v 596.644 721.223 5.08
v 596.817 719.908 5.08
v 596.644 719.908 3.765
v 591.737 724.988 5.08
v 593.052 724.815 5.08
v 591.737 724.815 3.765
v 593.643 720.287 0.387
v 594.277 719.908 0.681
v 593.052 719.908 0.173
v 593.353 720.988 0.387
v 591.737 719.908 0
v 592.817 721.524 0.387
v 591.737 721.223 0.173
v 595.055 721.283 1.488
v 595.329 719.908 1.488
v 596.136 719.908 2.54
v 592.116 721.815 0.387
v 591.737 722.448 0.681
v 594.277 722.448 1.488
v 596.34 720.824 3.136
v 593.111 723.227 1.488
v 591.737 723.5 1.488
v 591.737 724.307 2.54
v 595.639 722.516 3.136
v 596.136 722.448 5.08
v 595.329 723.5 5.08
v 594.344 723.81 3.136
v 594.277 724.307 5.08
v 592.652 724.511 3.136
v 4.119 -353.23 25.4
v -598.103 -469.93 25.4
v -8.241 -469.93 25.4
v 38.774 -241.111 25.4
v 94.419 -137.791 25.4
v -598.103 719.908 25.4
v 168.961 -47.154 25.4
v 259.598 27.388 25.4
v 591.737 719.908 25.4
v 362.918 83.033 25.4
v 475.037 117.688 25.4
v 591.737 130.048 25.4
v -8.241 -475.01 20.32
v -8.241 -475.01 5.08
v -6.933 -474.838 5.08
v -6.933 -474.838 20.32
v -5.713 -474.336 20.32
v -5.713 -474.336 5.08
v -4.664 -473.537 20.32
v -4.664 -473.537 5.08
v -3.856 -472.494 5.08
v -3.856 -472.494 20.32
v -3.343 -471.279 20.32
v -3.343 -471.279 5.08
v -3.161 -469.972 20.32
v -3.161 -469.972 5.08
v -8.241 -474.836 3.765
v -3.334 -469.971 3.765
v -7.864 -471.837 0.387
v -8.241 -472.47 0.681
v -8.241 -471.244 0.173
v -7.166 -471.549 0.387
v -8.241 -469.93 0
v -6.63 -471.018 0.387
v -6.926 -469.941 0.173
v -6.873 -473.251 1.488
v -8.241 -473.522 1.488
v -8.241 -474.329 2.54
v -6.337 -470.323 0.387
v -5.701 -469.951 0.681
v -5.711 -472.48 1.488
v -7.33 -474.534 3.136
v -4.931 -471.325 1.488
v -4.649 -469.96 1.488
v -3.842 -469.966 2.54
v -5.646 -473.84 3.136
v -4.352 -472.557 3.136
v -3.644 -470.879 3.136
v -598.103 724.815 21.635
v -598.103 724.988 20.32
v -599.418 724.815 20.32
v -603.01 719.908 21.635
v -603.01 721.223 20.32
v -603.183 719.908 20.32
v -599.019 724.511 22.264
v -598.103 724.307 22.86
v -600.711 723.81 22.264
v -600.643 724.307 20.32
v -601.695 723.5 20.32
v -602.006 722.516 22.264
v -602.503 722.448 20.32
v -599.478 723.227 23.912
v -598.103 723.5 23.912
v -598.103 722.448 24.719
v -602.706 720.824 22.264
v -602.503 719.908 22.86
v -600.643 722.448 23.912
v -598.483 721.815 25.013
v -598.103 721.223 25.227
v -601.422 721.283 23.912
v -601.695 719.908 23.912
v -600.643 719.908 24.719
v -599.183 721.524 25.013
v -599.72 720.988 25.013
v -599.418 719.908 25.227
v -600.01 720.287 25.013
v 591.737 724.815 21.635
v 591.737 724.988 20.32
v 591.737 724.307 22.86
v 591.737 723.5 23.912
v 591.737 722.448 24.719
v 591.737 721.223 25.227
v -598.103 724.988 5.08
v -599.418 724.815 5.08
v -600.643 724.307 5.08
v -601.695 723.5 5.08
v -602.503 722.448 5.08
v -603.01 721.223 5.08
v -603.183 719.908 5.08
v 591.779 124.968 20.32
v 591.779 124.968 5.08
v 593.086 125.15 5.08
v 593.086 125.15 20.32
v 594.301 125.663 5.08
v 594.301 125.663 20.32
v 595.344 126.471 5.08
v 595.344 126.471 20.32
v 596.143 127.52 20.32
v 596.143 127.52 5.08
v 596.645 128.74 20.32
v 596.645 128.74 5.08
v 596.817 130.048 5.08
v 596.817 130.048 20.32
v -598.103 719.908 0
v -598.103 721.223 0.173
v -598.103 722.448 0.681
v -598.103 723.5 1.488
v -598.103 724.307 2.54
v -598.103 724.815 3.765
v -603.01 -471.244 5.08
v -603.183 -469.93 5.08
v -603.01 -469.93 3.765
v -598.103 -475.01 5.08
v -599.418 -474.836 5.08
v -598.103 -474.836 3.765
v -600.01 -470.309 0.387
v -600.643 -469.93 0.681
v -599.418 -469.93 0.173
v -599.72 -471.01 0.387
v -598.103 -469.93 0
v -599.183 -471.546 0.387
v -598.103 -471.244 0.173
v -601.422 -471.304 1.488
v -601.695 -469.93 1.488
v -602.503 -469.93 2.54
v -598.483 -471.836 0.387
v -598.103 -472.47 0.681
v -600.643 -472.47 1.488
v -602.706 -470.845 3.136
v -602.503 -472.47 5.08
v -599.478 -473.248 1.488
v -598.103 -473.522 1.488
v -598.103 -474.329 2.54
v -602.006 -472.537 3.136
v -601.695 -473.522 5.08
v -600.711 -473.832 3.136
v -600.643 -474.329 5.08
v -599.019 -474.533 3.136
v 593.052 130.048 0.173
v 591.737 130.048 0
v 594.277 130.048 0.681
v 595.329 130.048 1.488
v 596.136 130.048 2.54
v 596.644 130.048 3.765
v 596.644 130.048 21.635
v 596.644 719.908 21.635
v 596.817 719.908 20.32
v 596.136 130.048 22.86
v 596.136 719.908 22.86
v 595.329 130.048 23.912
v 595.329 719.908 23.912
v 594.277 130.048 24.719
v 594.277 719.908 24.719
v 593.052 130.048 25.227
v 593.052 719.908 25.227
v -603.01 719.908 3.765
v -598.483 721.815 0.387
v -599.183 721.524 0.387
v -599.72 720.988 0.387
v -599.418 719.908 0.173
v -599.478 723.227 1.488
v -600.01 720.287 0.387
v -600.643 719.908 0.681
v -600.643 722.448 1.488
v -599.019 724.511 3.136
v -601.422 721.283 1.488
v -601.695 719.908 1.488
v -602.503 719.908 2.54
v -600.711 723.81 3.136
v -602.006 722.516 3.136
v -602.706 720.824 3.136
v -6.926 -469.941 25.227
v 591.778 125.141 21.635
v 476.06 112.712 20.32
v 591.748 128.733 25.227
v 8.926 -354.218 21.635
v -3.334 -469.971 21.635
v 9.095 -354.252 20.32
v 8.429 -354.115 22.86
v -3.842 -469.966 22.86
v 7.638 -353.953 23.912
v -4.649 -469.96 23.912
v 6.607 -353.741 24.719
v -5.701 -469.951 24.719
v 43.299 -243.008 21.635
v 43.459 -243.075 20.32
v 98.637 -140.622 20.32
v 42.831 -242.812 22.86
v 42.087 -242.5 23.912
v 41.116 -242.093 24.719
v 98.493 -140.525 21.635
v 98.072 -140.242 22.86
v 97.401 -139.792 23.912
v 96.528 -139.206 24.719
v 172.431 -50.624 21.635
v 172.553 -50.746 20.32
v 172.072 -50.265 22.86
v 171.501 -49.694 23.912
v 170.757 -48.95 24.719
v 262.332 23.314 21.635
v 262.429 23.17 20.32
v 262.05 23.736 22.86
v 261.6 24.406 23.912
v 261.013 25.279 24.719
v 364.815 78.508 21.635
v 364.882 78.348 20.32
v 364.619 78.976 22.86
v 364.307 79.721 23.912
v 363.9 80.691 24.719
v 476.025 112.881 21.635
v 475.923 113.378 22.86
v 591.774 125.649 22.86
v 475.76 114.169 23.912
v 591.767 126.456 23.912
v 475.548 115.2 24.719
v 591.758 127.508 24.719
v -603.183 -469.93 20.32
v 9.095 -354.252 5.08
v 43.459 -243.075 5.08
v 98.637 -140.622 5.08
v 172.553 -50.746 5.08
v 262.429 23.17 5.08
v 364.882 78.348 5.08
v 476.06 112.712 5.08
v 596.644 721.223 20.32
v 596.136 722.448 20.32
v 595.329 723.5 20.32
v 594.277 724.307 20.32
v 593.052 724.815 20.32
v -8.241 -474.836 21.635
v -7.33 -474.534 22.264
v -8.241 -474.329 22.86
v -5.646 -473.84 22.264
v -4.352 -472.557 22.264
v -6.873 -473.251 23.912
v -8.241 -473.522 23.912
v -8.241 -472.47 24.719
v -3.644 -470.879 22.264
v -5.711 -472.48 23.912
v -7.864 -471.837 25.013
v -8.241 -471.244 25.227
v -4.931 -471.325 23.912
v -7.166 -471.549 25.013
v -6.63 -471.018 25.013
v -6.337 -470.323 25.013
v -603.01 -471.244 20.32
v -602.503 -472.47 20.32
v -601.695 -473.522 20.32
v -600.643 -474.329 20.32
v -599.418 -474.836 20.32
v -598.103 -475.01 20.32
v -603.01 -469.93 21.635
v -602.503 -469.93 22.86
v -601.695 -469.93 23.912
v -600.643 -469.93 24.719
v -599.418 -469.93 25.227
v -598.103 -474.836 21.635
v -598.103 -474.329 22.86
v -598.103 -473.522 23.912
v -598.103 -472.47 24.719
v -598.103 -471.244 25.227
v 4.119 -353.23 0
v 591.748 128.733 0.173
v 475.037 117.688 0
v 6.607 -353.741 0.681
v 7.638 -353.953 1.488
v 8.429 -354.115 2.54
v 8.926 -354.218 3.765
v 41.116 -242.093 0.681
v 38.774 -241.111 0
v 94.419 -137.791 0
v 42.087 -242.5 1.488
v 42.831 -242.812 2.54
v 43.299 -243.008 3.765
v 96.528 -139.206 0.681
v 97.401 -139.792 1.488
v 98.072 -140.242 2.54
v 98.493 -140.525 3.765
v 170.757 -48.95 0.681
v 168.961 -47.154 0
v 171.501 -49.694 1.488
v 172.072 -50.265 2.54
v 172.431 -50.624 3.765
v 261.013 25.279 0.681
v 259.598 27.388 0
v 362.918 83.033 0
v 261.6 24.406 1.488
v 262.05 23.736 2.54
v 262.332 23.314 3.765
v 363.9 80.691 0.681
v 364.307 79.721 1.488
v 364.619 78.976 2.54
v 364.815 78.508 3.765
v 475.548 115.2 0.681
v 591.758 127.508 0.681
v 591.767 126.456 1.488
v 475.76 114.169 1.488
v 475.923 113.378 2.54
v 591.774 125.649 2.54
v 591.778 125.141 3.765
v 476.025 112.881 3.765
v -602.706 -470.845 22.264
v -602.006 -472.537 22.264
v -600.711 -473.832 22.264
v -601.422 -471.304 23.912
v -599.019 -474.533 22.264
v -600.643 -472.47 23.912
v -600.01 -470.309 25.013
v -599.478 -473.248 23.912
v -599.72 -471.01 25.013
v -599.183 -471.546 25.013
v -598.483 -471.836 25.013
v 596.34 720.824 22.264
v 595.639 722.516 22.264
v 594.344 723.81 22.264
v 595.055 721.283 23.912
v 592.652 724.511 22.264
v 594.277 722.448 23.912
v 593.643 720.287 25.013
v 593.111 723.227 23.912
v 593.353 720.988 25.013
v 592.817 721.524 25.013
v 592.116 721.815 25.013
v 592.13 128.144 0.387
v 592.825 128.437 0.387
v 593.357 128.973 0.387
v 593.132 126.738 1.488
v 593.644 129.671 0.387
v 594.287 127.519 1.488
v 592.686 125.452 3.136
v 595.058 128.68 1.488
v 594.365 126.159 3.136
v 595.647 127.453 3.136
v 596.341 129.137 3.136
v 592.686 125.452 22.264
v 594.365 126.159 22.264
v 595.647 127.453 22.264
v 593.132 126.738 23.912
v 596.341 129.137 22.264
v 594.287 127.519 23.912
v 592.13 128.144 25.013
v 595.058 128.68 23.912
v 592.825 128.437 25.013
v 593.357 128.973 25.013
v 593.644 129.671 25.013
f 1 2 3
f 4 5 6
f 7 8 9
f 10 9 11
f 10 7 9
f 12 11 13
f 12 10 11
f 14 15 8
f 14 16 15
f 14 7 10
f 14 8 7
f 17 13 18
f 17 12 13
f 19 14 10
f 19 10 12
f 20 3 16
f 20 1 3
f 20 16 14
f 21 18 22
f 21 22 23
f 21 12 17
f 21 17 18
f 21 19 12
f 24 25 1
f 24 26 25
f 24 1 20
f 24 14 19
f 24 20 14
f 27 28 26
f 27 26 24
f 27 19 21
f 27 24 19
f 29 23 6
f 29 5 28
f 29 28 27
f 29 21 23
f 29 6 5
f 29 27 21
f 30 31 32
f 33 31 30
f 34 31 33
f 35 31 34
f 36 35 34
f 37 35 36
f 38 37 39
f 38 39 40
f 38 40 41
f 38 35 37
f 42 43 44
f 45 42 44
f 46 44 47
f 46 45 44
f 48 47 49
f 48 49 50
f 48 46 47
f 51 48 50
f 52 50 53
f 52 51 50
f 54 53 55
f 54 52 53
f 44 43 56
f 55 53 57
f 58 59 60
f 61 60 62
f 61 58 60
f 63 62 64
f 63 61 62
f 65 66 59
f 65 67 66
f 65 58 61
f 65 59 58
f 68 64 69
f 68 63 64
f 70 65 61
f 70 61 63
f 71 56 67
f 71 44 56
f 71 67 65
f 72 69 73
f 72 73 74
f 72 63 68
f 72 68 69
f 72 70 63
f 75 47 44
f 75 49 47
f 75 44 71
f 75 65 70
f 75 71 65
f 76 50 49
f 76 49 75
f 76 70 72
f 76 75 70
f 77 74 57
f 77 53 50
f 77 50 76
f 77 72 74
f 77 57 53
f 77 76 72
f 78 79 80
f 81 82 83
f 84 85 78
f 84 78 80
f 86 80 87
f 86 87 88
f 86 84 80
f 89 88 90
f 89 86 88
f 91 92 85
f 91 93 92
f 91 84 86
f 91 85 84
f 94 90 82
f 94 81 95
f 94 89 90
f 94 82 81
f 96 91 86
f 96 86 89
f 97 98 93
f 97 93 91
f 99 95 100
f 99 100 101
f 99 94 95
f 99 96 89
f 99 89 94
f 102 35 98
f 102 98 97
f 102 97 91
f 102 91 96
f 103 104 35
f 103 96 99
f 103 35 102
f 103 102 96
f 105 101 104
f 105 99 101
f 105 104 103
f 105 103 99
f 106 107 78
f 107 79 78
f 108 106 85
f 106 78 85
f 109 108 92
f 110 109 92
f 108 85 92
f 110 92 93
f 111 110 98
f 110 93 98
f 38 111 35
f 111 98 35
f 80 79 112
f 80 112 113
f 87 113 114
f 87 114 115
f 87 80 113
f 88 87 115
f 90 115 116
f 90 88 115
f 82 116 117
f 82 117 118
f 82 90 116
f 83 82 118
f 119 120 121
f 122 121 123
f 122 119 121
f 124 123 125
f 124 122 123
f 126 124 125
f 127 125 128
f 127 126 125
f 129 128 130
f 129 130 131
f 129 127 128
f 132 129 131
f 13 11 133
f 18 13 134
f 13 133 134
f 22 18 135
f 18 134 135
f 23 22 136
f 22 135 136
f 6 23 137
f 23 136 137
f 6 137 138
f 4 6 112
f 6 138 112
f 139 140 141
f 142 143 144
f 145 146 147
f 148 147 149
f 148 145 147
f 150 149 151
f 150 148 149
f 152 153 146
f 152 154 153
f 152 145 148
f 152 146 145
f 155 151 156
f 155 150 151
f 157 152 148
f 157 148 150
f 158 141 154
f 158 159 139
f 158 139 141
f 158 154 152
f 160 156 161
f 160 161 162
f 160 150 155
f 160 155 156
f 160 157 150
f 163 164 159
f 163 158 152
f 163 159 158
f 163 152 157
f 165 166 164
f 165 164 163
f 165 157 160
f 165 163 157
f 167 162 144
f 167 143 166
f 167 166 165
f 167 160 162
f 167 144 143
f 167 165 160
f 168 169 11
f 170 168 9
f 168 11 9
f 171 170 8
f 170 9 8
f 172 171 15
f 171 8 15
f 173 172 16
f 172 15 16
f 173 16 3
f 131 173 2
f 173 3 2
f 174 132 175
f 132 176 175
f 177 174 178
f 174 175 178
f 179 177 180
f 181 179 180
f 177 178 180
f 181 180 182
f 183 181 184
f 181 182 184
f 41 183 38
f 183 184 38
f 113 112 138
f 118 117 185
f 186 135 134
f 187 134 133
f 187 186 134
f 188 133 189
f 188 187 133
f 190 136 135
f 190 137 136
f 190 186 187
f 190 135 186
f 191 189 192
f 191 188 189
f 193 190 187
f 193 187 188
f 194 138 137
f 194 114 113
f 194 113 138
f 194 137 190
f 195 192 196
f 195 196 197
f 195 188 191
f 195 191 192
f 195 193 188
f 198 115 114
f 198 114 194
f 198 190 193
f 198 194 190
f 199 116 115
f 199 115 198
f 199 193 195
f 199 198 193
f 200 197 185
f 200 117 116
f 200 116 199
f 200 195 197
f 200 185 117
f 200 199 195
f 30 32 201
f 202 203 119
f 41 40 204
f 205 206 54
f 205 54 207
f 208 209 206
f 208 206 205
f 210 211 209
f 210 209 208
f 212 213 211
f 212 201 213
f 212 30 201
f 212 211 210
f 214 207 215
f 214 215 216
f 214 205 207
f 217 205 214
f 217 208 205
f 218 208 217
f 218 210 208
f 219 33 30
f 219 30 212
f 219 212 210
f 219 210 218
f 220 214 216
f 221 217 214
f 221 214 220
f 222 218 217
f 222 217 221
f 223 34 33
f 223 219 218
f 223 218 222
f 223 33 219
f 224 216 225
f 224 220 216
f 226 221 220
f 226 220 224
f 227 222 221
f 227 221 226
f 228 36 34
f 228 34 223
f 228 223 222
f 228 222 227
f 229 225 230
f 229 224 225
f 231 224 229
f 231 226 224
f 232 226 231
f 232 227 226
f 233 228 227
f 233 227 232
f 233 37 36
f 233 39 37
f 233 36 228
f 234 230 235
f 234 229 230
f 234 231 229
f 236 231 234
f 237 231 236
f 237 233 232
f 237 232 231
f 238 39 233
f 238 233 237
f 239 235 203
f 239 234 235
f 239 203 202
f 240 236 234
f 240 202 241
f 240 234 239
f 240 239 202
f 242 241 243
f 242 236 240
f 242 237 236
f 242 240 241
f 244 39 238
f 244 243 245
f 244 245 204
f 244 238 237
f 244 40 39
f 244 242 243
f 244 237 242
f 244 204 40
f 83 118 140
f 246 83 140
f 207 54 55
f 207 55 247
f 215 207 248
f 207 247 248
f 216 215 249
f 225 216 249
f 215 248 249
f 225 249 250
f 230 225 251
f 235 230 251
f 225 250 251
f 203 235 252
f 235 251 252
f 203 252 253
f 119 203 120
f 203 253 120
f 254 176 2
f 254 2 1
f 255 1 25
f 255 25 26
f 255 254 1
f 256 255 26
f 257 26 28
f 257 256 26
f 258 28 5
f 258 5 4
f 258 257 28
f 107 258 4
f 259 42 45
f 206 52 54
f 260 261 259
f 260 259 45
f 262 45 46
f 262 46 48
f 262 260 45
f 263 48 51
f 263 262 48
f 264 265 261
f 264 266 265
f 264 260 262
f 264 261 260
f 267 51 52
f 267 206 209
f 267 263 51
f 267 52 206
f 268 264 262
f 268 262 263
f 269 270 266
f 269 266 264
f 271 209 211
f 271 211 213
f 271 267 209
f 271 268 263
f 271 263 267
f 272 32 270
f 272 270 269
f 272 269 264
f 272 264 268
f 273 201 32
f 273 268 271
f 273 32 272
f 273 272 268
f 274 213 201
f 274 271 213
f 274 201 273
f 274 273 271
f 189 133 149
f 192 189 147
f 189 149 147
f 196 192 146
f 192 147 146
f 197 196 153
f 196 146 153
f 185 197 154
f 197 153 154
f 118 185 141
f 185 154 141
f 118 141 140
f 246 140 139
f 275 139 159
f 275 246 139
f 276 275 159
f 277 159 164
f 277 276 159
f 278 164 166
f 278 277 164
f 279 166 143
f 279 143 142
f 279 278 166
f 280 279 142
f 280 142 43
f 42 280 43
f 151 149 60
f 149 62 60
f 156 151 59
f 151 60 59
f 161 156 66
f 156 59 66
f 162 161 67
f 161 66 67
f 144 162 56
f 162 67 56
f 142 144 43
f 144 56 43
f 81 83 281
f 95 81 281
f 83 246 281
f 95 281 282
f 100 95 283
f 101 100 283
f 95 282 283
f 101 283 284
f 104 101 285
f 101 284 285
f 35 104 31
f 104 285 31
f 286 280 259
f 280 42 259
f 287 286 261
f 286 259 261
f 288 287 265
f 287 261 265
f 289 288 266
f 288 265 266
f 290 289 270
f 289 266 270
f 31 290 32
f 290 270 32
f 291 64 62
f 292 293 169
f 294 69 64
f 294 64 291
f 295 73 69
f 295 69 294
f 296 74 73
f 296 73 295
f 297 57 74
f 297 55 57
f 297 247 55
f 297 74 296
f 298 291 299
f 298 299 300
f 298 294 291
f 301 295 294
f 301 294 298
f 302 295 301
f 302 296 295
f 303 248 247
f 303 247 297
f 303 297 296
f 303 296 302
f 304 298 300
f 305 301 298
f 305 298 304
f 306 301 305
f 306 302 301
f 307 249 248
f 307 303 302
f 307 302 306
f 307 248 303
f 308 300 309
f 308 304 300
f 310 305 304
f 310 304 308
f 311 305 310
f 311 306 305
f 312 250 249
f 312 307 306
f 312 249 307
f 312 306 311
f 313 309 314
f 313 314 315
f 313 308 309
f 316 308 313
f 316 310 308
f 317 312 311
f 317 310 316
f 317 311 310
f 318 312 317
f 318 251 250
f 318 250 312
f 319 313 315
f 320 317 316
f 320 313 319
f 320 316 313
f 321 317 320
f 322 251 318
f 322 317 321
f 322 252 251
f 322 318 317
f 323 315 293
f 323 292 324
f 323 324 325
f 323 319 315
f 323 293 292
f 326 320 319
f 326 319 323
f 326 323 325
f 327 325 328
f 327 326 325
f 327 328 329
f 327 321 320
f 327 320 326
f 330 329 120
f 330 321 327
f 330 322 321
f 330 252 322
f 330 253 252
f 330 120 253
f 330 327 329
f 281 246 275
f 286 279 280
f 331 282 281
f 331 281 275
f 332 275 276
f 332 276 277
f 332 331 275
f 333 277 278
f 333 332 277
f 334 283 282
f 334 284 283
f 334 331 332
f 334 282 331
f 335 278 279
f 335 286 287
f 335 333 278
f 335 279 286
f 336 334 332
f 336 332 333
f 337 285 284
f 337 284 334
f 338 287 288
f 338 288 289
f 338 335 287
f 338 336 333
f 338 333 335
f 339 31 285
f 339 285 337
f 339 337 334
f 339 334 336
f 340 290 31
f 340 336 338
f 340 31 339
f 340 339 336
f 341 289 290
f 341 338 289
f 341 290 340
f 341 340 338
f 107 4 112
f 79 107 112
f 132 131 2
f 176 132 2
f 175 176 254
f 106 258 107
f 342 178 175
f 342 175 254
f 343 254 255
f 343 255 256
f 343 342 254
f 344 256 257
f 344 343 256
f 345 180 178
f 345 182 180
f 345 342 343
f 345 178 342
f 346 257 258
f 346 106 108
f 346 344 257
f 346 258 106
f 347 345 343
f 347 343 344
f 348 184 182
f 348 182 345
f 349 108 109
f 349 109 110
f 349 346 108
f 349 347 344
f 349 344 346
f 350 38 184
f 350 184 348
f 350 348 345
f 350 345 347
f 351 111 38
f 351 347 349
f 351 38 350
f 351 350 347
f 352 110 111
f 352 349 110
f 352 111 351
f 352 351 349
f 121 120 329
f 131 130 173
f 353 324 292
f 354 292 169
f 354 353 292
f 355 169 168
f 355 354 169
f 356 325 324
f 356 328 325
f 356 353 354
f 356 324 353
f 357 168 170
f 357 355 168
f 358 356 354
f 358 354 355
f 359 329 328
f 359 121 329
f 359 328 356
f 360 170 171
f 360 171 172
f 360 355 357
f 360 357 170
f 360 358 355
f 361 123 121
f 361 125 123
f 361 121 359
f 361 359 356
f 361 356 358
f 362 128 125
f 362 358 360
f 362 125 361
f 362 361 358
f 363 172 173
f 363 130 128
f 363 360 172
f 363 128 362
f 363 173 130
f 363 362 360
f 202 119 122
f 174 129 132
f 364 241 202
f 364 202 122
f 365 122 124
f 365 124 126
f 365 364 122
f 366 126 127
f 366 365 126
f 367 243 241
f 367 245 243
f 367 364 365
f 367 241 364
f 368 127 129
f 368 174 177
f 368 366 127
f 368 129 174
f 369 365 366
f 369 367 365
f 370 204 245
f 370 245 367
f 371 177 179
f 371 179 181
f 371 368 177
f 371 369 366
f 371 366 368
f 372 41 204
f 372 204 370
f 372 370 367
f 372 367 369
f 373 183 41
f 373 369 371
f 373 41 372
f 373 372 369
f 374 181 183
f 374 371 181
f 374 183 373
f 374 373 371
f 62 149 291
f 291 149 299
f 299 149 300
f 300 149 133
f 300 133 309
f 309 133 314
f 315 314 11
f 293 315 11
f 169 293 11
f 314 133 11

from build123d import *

# Parameters (mm, degrees)
F1_DEPTH = 25.4
F2_R     = 5.08
F3_R     = 5.08
F4_R     = 5.08
F5_R     = 5.08
F6_R     = 5.08
F9_R     = 5.08
F10_R    = 5.08


# Not quite as in the source:
# - the program builds the solid bodies; features that only make, move or delete a surface that nothing else refers to are left out


with BuildPart() as f1:
    # F0 (on Top) → F1 (new body)
    with BuildSketch(Plane.XY):
        with BuildLine():
            Line((596.8167068857, 124.9892751187), (596.8167068857, 724.9880751187))
            Line((596.8167068857, 724.9880751187), (-603.1832931143, 724.9880751187))
            Line((-603.1832931143, 724.9880751187), (-603.1832931143, -475.0095248813))
            Line((-603.1832931143, -475.0095248813), (-3.1820931143, -475.0095248813))
            ThreePointArc((-3.1820931143, -475.0095248813), (172.5534867019, -50.7463046975), (596.8167068857, 124.9892751187))
        make_face()
    extrude(amount=F1_DEPTH)

    # F2
    f2_edges = [f1.edges().sort_by_distance(p)[0] for p in [
        (-603.183293, -475.009525, 12.7),
    ]]
    fillet(f2_edges, radius=F2_R)

    # F3
    f3_edges = [f1.edges().sort_by_distance(p)[0] for p in [
        (-3.182093, -475.009525, 12.7),
    ]]
    fillet(f3_edges, radius=F3_R)

    # F4
    f4_edges = [f1.edges().sort_by_distance(p)[0] for p in [
        (596.816707, 124.989275, 12.7),
    ]]
    fillet(f4_edges, radius=F4_R)

    # F5
    f5_edges = [f1.edges().sort_by_distance(p)[0] for p in [
        (596.816707, 724.988075, 12.7),
    ]]
    fillet(f5_edges, radius=F5_R)

    # F6
    f6_edges = [f1.edges().sort_by_distance(p)[0] for p in [
        (-603.183293, 724.988075, 12.7),
    ]]
    fillet(f6_edges, radius=F6_R)

    # F9
    f9_edges = [f1.edges().sort_by_distance(p)[0] for p in [
        (-303.172031, -475.009525, 0),
    ]]
    fillet(f9_edges, radius=F9_R)

    # F10
    f10_edges = [f1.edges().sort_by_distance(p)[0] for p in [
        (-303.172031, -475.009525, 25.4),
    ]]
    fillet(f10_edges, radius=F10_R)


solid = f1.part
